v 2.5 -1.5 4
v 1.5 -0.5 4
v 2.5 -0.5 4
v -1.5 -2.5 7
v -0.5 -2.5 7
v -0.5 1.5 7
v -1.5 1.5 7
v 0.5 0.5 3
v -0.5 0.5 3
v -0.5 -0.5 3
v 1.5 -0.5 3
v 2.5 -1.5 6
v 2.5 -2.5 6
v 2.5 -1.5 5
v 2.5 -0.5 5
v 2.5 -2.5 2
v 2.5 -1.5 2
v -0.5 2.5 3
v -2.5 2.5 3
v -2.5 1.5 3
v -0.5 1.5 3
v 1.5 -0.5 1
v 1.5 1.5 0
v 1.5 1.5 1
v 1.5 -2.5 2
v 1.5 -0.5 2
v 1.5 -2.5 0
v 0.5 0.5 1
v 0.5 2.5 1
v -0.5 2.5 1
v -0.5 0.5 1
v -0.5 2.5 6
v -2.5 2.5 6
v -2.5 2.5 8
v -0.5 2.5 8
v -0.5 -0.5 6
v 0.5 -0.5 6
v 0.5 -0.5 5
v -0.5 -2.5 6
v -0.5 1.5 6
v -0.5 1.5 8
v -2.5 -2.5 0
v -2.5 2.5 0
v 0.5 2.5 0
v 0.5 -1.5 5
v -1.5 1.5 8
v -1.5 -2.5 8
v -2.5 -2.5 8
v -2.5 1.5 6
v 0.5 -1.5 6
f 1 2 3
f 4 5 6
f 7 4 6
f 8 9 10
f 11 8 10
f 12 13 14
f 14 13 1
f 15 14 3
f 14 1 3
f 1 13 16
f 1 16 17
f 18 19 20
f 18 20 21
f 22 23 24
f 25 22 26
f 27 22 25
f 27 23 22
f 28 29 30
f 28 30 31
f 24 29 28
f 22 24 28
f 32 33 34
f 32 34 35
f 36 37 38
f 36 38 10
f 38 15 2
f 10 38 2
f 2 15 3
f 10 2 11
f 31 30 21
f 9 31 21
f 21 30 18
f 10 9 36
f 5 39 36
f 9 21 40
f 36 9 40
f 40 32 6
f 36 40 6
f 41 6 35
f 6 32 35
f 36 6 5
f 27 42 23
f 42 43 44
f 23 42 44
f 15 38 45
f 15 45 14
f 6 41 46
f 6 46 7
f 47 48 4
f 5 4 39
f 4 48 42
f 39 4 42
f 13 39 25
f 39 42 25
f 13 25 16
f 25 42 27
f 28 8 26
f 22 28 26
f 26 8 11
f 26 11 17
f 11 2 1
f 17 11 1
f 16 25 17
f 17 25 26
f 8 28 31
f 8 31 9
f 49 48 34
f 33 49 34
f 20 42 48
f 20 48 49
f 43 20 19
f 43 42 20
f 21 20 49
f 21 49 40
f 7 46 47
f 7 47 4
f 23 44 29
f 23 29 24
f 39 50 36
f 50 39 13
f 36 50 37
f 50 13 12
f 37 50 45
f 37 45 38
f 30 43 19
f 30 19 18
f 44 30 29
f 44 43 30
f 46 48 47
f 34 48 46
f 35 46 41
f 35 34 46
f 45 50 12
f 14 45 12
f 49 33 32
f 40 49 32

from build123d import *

# Parameters (mm, degrees)
SKETCH1_W           = 5
SKETCH1_H           = 5
BOSS_EXTRUDE1_DEPTH = 8
SKETCH2_W           = 2
SKETCH2_H           = 3
CUT_EXTRUDE1_DEPTH  = 1
SKETCH4_W           = 1
SKETCH4_H           = 4
CUT_EXTRUDE4_DEPTH  = 4
SKETCH5_W           = 1
SKETCH5_H           = 2
CUT_EXTRUDE5_DEPTH  = 3
CUT_EXTRUDE6_DEPTH  = 3
SKETCH7_W           = 2
SKETCH7_H           = 1
CUT_EXTRUDE7_DEPTH  = 1
CUT_EXTRUDE8_DEPTH  = 2
CUT_EXTRUDE9_DEPTH  = 2
CUT_EXTRUDE10_DEPTH = 2


with BuildPart() as part:
    # Sketch1 → Boss-Extrude1 (new body)
    with BuildSketch(Plane.XY):
        Rectangle(SKETCH1_W, SKETCH1_H)
    extrude(amount=BOSS_EXTRUDE1_DEPTH)

    # Sketch2 → Cut-Extrude1 (cut)
    with BuildSketch(Plane(origin=(0, 2.5, 0), x_dir=(1, 0, 0), z_dir=(0, 1, 0))):
        with Locations((-1.5, -4.5)):
            Rectangle(SKETCH2_W, SKETCH2_H)
    extrude(amount=-CUT_EXTRUDE1_DEPTH, mode=Mode.SUBTRACT)

    # Sketch4 → Cut-Extrude4 (cut)
    with BuildSketch(Plane(origin=(2.5, 0, 0), x_dir=(0, 0, -1), z_dir=(1, 0, 0))):
        with Locations((-7.5, -0.5)):
            Rectangle(SKETCH4_W, SKETCH4_H)
    extrude(amount=-CUT_EXTRUDE4_DEPTH, mode=Mode.SUBTRACT)

    # Sketch5 → Cut-Extrude5 (cut)
    with BuildSketch(Plane(origin=(2.5, 0, 0), x_dir=(0, 0, -1), z_dir=(1, 0, 0))):
        with Locations((-6.5, -1.5)):
            Rectangle(SKETCH5_W, SKETCH5_H)
    extrude(amount=-CUT_EXTRUDE5_DEPTH, mode=Mode.SUBTRACT)

    # Sketch6 → Cut-Extrude6 (cut)
    with BuildSketch(Plane(origin=(2.5, 0, 0), x_dir=(0, 0, -1), z_dir=(1, 0, 0))):
        Polygon((-8, 1.5), (-8, 2.5), (-1, 2.5), (-1, 0.5), (-3, 0.5), (-3, -0.5), (-6, -0.5), (-7, -0.5), (-7, 1.5), align=None)
    extrude(amount=-CUT_EXTRUDE6_DEPTH, mode=Mode.SUBTRACT)

    # Sketch7 → Cut-Extrude7 (cut)
    with BuildSketch(Plane.XY.offset(6)):
        with Locations((1.5, -1)):
            Rectangle(SKETCH7_W, SKETCH7_H)
    extrude(amount=-CUT_EXTRUDE7_DEPTH, mode=Mode.SUBTRACT)

    # Sketch8 → Cut-Extrude8 (cut)
    with BuildSketch(Plane(origin=(0, 0, 0), x_dir=(-1, 0, 0), z_dir=(0, 0, -1))):
        Polygon((-0.5, 2.5), (-1.5, 1.5), (-1.5, -2.5), (-2.5, -2.5), (-2.5, 2.5), align=None)
    extrude(amount=-CUT_EXTRUDE8_DEPTH, mode=Mode.SUBTRACT)

    # Sketch9 → Cut-Extrude9 (cut)
    with BuildSketch(Plane.XY.offset(3)):
        Polygon((0.5, 0.5), (1.5, -0.5), (2.5, -0.5), (2.5, 0.5), align=None)
    extrude(amount=-CUT_EXTRUDE9_DEPTH, mode=Mode.SUBTRACT)

    # Sketch10 → Cut-Extrude10 (cut)
    with BuildSketch(Plane(origin=(0, 0, 2), x_dir=(-1, 0, 0), z_dir=(0, 0, -1))):
        Polygon((-1.5, -0.5), (-2.5, -1.5), (-2.5, -0.5), align=None)
    extrude(amount=-CUT_EXTRUDE10_DEPTH, mode=Mode.SUBTRACT)


solid = part.part
